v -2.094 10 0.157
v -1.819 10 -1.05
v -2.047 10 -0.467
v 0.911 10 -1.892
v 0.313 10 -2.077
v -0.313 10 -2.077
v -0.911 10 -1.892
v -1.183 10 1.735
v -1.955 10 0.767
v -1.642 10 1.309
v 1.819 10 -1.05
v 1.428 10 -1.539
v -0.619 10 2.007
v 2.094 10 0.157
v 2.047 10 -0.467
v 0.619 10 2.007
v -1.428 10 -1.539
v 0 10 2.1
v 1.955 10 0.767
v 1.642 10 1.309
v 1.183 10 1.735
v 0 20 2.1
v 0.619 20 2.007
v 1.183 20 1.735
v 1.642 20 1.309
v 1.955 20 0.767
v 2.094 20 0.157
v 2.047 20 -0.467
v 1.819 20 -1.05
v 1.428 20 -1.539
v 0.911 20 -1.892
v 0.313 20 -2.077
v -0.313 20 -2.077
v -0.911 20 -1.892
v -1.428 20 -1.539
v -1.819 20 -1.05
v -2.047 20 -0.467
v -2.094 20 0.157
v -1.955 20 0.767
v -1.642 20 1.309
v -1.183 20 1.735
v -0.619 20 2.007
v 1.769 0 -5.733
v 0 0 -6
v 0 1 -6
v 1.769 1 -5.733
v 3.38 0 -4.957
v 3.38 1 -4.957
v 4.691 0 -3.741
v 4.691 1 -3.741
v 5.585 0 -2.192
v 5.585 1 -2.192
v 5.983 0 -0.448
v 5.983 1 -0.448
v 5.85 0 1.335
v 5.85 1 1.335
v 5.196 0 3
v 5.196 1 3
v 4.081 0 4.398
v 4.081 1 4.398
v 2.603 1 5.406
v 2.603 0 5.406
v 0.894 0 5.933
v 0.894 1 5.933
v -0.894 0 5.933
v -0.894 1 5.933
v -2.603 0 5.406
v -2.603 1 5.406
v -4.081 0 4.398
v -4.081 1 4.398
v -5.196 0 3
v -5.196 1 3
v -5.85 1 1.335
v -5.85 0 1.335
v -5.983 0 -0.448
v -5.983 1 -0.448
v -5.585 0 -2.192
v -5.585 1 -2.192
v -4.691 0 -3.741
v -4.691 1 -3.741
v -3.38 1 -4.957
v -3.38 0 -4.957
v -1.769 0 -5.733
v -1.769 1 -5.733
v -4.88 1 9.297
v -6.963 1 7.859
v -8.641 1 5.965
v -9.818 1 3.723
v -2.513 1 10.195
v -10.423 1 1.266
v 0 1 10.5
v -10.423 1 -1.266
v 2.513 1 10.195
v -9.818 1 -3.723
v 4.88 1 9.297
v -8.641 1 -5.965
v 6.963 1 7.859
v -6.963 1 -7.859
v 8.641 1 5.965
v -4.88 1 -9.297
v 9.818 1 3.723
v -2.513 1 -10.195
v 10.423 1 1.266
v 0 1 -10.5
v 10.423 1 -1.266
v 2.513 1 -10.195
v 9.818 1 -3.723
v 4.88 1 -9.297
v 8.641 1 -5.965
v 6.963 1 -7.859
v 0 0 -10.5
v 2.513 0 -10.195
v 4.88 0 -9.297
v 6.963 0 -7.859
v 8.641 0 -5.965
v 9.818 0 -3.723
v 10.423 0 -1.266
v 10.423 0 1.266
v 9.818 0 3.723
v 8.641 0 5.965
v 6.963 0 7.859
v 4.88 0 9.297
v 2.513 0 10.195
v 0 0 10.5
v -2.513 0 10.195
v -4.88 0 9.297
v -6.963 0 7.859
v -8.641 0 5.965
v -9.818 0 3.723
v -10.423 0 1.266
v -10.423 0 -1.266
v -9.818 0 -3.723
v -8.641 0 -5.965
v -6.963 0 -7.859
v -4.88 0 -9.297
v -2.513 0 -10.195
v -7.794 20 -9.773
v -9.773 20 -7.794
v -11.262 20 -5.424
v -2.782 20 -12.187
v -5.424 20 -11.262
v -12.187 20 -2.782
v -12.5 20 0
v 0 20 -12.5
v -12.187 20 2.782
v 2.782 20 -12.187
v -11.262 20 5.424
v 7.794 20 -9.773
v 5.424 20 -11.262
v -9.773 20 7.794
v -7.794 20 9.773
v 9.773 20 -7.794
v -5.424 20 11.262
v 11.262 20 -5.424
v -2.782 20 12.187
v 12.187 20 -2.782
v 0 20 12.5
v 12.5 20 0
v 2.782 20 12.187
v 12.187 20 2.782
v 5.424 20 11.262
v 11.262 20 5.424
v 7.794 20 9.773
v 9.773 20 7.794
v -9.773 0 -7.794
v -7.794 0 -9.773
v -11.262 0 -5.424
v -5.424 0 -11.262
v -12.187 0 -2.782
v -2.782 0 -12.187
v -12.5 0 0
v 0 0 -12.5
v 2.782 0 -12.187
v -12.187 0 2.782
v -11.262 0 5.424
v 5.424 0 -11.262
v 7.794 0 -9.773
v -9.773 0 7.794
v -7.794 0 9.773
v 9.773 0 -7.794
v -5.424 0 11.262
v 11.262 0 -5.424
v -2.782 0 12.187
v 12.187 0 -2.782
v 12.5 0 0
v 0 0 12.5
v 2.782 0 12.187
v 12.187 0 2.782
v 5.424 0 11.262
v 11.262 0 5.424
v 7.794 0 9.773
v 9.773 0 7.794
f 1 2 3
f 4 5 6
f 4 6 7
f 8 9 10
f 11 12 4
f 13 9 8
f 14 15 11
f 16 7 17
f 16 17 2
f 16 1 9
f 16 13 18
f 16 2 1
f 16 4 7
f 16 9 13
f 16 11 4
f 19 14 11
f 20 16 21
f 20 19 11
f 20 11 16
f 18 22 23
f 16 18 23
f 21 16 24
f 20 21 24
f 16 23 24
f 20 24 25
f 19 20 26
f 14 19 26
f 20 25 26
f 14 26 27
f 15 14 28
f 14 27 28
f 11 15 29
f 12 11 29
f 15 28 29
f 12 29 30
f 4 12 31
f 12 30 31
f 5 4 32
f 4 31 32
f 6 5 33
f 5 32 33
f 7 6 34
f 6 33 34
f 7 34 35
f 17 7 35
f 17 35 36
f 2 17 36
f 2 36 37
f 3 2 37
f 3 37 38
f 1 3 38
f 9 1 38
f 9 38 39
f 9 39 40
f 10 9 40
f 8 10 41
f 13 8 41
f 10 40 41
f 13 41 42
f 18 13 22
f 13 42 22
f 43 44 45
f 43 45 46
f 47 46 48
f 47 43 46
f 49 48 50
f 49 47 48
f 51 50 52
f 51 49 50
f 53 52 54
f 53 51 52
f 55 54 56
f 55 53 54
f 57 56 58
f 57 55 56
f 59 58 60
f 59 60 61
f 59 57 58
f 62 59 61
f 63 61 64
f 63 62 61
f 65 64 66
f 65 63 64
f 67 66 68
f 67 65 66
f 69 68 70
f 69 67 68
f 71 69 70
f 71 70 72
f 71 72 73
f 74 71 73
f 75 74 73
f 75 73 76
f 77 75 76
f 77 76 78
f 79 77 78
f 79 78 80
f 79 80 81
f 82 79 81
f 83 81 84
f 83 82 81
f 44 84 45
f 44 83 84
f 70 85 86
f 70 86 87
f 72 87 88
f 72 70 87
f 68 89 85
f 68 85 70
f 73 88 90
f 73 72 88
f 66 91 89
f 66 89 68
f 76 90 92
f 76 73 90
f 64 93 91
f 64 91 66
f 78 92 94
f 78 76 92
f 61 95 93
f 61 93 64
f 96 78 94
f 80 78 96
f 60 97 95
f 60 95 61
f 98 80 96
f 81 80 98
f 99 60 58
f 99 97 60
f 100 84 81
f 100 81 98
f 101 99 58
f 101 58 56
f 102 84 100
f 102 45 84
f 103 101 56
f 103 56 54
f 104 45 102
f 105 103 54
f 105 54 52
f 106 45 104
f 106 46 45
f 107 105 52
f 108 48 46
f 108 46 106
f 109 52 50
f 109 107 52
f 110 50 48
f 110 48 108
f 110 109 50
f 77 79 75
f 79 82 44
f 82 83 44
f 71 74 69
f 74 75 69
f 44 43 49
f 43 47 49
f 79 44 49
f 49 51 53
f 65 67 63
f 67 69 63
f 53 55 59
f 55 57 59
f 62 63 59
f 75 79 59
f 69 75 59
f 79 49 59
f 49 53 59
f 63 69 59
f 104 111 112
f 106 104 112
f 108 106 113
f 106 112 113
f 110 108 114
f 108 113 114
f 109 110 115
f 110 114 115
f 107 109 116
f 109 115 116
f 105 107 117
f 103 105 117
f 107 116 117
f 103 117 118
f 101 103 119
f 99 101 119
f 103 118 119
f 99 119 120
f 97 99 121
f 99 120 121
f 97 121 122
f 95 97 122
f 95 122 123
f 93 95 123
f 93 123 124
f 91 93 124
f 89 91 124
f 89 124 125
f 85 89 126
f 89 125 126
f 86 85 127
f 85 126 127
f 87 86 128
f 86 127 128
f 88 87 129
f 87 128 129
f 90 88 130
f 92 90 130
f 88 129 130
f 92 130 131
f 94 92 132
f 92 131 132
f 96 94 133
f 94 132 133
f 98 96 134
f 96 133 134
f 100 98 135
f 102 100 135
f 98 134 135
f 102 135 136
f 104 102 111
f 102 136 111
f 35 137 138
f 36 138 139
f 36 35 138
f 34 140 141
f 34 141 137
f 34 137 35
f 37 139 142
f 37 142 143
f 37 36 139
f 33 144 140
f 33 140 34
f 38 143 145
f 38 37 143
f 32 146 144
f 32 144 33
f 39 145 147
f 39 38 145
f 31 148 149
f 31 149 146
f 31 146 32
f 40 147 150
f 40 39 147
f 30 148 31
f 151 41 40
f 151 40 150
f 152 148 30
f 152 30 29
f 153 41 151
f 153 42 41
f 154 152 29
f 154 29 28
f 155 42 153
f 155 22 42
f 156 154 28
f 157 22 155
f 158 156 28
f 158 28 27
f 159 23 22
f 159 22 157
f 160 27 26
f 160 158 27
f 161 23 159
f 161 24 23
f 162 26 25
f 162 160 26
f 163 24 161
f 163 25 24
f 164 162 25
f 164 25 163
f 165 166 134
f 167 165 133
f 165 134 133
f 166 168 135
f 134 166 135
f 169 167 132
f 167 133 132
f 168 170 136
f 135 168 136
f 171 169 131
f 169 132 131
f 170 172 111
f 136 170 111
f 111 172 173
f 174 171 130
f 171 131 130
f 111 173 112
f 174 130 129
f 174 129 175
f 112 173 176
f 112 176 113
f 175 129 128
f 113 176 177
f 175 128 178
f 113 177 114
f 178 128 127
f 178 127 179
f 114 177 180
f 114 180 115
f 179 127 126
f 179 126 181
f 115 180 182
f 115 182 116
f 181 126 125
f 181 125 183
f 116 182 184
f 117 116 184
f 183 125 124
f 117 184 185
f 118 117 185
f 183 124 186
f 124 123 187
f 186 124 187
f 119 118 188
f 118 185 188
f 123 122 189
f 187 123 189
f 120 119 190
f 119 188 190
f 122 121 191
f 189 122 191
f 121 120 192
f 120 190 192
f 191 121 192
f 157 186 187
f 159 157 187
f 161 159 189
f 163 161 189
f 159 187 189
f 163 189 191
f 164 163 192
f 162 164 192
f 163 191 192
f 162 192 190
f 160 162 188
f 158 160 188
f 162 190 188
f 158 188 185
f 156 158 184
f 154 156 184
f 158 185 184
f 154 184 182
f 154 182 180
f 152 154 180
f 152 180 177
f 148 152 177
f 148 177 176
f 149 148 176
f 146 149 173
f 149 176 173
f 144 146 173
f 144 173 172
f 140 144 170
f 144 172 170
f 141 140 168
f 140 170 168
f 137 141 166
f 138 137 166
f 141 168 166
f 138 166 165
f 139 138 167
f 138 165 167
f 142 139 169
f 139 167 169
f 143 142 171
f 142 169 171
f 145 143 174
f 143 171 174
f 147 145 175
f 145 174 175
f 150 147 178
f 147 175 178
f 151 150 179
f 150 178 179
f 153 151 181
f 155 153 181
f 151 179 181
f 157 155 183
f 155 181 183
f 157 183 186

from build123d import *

# Parameters (mm, degrees)
SKETCH_1_R          = 12.5
EXTRUDE_1_DEPTH     = 20
SKETCH_2_R          = 10.5
SKETCH_2_R_2        = 6
CUT_EXTRUDE_1_DEPTH = 1
SKETCH_3_R          = 2.1
CUT_EXTRUDE_2_DEPTH = 10


with BuildPart() as part:
    # 草图1 → 凸台-拉伸1 (new body)
    with BuildSketch(Plane(origin=(0, 0, 0), x_dir=(1, 0, 0), z_dir=(0, 1, 0))):
        with Locations(Location((0, 0, 0), (0, 0, 270))):
            Circle(SKETCH_1_R)
    extrude(amount=EXTRUDE_1_DEPTH)

    # 草图2 → 切除-拉伸1 (cut)
    with BuildSketch(Plane.XZ):
        with Locations(Location((0, 0, 0), (0, 0, 270))):
            Circle(SKETCH_2_R)
        with Locations(Location((0, 0, 0), (0, 0, 270))):
            Circle(SKETCH_2_R_2, mode=Mode.SUBTRACT)
    extrude(amount=-CUT_EXTRUDE_1_DEPTH, mode=Mode.SUBTRACT)

    # 草图3 → 切除-拉伸2 (cut)
    with BuildSketch(Plane(origin=(0, 20, 0), x_dir=(1, 0, 0), z_dir=(0, 1, 0))):
        with Locations(Location((0, 0, 0), (0, 0, 270))):
            Circle(SKETCH_3_R)
    extrude(amount=-CUT_EXTRUDE_2_DEPTH, mode=Mode.SUBTRACT)


solid = part.part
